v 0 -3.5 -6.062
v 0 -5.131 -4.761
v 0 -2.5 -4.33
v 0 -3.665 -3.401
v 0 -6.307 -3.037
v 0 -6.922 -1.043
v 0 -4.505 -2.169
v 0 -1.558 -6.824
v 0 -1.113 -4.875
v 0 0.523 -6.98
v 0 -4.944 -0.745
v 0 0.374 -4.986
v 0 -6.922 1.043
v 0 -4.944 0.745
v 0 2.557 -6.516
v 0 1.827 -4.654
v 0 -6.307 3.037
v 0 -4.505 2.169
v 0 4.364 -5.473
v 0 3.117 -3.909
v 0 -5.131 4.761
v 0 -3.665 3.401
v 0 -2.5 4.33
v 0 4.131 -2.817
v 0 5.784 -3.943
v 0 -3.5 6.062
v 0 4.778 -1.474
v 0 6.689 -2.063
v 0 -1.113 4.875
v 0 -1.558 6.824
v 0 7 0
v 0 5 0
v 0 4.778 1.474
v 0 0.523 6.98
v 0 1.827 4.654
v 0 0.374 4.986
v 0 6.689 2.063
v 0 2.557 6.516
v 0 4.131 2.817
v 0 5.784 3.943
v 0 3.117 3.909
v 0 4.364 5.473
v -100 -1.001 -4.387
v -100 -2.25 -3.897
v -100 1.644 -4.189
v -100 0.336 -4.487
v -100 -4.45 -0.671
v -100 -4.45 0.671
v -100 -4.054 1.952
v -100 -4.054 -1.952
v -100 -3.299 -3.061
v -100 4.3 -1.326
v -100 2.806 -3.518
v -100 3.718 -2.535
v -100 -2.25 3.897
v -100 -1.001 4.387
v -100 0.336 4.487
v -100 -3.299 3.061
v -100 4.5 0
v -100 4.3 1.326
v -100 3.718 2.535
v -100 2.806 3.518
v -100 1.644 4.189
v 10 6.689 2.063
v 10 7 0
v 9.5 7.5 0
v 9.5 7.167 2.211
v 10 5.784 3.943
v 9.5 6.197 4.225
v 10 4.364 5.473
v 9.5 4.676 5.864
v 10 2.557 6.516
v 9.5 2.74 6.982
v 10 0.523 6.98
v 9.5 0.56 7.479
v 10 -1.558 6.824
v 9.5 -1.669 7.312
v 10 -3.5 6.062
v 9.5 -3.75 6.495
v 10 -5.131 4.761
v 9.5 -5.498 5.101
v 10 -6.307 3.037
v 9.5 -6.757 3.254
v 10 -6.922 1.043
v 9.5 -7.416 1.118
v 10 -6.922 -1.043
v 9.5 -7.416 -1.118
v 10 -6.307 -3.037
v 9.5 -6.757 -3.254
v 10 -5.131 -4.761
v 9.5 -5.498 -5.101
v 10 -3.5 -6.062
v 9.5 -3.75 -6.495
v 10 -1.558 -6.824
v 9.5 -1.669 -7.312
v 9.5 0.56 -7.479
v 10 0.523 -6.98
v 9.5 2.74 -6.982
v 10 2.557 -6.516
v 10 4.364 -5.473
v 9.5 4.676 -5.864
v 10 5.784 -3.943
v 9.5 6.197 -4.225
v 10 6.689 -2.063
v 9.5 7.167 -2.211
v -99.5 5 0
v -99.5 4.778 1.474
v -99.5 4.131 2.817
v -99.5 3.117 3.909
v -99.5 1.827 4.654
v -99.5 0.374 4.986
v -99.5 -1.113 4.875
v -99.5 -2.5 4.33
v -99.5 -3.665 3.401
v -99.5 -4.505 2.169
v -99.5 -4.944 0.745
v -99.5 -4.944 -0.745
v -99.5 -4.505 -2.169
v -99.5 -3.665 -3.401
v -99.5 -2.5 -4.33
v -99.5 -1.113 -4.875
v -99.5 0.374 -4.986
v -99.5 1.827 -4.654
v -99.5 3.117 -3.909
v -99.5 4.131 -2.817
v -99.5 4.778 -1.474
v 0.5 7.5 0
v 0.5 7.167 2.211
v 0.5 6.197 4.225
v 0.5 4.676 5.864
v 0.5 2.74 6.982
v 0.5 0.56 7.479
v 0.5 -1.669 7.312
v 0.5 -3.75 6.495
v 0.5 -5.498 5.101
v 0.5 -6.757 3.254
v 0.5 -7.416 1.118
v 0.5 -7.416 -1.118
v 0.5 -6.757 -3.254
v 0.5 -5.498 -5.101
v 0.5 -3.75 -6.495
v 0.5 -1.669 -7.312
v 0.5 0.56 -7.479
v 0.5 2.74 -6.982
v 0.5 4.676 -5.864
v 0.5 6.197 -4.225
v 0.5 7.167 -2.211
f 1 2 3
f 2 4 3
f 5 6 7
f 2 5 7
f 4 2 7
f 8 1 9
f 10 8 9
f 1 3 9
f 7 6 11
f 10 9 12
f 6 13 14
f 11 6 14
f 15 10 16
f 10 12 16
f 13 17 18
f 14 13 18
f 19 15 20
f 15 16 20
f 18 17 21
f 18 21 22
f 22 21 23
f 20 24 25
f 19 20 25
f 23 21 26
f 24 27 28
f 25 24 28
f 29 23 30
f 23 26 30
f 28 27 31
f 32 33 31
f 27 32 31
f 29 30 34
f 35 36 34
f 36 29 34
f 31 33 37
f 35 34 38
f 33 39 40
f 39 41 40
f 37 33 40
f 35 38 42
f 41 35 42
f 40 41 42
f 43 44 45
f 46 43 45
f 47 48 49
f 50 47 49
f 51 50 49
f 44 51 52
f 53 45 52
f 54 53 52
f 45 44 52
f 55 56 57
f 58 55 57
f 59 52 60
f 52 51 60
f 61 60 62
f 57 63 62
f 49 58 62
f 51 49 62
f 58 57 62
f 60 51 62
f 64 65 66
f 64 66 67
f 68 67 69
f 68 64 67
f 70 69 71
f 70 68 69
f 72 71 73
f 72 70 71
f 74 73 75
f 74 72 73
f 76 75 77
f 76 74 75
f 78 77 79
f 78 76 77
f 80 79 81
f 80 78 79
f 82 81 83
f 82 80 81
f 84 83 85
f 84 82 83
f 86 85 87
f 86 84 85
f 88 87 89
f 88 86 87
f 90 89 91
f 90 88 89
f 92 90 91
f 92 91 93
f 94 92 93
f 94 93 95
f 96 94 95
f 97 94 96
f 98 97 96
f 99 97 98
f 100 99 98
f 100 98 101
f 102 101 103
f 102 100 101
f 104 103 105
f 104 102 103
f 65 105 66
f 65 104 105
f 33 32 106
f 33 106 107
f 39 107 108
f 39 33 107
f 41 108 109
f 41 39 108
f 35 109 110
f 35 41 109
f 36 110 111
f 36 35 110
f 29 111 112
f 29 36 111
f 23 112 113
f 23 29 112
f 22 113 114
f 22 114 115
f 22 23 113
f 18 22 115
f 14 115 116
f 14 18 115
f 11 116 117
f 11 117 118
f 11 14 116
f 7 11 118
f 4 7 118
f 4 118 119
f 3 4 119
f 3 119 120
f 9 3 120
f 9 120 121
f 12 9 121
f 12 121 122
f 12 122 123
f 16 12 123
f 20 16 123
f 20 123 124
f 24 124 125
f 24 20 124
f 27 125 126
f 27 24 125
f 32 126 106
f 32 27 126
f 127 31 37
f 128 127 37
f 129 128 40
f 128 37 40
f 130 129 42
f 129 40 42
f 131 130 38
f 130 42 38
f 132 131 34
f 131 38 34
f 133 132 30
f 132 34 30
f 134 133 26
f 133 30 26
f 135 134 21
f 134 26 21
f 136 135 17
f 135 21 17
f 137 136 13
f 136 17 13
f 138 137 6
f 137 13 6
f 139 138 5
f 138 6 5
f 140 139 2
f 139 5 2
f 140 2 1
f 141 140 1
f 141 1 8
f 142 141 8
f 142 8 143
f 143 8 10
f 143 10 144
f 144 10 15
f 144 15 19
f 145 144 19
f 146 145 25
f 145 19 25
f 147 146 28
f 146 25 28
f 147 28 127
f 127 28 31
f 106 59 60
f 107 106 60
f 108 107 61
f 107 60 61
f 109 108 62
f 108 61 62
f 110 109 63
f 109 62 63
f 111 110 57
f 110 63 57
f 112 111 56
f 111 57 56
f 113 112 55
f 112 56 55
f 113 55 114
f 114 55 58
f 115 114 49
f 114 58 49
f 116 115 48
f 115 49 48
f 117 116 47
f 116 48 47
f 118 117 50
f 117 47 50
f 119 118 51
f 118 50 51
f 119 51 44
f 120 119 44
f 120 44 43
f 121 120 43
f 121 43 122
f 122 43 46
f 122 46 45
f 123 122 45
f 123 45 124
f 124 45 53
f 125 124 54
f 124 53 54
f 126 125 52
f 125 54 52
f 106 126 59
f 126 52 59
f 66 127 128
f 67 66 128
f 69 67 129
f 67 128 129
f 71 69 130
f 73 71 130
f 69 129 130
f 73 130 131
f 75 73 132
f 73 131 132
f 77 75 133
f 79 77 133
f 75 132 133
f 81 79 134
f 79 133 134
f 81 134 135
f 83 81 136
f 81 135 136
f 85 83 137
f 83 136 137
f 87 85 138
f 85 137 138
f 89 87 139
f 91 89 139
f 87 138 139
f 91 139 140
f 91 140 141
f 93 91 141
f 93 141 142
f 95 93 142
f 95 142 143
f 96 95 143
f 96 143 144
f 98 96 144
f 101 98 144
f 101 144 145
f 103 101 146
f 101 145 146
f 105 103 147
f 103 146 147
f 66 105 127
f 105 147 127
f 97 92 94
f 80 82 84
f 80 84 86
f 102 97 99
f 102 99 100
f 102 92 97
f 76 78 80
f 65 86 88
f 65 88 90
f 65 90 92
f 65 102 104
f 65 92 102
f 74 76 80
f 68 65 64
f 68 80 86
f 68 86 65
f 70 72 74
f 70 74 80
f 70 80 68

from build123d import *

# Parameters (mm, degrees)
F0_R     = 5
F1_DEPTH = 100
F2_R     = 7.5
F3_DEPTH = 10
F4_SIZE  = 0.5


with BuildPart() as f1:
    # F0 (on Right) → F1 (new body)
    with BuildSketch(Plane.YZ):
        Circle(F0_R)
    extrude(amount=-F1_DEPTH)

    # F2 (on Right) → F3 (join)
    with BuildSketch(Plane.YZ):
        Circle(F2_R)
    extrude(amount=F3_DEPTH)

    # F4
    f4_edges = [f1.edges().sort_by_distance(p)[0] for p in [
        (10, -7.5, 0),
        (-100, -5, 0),
        (0, -7.5, 0),
    ]]
    chamfer(f4_edges, length=F4_SIZE)


solid = f1.part
